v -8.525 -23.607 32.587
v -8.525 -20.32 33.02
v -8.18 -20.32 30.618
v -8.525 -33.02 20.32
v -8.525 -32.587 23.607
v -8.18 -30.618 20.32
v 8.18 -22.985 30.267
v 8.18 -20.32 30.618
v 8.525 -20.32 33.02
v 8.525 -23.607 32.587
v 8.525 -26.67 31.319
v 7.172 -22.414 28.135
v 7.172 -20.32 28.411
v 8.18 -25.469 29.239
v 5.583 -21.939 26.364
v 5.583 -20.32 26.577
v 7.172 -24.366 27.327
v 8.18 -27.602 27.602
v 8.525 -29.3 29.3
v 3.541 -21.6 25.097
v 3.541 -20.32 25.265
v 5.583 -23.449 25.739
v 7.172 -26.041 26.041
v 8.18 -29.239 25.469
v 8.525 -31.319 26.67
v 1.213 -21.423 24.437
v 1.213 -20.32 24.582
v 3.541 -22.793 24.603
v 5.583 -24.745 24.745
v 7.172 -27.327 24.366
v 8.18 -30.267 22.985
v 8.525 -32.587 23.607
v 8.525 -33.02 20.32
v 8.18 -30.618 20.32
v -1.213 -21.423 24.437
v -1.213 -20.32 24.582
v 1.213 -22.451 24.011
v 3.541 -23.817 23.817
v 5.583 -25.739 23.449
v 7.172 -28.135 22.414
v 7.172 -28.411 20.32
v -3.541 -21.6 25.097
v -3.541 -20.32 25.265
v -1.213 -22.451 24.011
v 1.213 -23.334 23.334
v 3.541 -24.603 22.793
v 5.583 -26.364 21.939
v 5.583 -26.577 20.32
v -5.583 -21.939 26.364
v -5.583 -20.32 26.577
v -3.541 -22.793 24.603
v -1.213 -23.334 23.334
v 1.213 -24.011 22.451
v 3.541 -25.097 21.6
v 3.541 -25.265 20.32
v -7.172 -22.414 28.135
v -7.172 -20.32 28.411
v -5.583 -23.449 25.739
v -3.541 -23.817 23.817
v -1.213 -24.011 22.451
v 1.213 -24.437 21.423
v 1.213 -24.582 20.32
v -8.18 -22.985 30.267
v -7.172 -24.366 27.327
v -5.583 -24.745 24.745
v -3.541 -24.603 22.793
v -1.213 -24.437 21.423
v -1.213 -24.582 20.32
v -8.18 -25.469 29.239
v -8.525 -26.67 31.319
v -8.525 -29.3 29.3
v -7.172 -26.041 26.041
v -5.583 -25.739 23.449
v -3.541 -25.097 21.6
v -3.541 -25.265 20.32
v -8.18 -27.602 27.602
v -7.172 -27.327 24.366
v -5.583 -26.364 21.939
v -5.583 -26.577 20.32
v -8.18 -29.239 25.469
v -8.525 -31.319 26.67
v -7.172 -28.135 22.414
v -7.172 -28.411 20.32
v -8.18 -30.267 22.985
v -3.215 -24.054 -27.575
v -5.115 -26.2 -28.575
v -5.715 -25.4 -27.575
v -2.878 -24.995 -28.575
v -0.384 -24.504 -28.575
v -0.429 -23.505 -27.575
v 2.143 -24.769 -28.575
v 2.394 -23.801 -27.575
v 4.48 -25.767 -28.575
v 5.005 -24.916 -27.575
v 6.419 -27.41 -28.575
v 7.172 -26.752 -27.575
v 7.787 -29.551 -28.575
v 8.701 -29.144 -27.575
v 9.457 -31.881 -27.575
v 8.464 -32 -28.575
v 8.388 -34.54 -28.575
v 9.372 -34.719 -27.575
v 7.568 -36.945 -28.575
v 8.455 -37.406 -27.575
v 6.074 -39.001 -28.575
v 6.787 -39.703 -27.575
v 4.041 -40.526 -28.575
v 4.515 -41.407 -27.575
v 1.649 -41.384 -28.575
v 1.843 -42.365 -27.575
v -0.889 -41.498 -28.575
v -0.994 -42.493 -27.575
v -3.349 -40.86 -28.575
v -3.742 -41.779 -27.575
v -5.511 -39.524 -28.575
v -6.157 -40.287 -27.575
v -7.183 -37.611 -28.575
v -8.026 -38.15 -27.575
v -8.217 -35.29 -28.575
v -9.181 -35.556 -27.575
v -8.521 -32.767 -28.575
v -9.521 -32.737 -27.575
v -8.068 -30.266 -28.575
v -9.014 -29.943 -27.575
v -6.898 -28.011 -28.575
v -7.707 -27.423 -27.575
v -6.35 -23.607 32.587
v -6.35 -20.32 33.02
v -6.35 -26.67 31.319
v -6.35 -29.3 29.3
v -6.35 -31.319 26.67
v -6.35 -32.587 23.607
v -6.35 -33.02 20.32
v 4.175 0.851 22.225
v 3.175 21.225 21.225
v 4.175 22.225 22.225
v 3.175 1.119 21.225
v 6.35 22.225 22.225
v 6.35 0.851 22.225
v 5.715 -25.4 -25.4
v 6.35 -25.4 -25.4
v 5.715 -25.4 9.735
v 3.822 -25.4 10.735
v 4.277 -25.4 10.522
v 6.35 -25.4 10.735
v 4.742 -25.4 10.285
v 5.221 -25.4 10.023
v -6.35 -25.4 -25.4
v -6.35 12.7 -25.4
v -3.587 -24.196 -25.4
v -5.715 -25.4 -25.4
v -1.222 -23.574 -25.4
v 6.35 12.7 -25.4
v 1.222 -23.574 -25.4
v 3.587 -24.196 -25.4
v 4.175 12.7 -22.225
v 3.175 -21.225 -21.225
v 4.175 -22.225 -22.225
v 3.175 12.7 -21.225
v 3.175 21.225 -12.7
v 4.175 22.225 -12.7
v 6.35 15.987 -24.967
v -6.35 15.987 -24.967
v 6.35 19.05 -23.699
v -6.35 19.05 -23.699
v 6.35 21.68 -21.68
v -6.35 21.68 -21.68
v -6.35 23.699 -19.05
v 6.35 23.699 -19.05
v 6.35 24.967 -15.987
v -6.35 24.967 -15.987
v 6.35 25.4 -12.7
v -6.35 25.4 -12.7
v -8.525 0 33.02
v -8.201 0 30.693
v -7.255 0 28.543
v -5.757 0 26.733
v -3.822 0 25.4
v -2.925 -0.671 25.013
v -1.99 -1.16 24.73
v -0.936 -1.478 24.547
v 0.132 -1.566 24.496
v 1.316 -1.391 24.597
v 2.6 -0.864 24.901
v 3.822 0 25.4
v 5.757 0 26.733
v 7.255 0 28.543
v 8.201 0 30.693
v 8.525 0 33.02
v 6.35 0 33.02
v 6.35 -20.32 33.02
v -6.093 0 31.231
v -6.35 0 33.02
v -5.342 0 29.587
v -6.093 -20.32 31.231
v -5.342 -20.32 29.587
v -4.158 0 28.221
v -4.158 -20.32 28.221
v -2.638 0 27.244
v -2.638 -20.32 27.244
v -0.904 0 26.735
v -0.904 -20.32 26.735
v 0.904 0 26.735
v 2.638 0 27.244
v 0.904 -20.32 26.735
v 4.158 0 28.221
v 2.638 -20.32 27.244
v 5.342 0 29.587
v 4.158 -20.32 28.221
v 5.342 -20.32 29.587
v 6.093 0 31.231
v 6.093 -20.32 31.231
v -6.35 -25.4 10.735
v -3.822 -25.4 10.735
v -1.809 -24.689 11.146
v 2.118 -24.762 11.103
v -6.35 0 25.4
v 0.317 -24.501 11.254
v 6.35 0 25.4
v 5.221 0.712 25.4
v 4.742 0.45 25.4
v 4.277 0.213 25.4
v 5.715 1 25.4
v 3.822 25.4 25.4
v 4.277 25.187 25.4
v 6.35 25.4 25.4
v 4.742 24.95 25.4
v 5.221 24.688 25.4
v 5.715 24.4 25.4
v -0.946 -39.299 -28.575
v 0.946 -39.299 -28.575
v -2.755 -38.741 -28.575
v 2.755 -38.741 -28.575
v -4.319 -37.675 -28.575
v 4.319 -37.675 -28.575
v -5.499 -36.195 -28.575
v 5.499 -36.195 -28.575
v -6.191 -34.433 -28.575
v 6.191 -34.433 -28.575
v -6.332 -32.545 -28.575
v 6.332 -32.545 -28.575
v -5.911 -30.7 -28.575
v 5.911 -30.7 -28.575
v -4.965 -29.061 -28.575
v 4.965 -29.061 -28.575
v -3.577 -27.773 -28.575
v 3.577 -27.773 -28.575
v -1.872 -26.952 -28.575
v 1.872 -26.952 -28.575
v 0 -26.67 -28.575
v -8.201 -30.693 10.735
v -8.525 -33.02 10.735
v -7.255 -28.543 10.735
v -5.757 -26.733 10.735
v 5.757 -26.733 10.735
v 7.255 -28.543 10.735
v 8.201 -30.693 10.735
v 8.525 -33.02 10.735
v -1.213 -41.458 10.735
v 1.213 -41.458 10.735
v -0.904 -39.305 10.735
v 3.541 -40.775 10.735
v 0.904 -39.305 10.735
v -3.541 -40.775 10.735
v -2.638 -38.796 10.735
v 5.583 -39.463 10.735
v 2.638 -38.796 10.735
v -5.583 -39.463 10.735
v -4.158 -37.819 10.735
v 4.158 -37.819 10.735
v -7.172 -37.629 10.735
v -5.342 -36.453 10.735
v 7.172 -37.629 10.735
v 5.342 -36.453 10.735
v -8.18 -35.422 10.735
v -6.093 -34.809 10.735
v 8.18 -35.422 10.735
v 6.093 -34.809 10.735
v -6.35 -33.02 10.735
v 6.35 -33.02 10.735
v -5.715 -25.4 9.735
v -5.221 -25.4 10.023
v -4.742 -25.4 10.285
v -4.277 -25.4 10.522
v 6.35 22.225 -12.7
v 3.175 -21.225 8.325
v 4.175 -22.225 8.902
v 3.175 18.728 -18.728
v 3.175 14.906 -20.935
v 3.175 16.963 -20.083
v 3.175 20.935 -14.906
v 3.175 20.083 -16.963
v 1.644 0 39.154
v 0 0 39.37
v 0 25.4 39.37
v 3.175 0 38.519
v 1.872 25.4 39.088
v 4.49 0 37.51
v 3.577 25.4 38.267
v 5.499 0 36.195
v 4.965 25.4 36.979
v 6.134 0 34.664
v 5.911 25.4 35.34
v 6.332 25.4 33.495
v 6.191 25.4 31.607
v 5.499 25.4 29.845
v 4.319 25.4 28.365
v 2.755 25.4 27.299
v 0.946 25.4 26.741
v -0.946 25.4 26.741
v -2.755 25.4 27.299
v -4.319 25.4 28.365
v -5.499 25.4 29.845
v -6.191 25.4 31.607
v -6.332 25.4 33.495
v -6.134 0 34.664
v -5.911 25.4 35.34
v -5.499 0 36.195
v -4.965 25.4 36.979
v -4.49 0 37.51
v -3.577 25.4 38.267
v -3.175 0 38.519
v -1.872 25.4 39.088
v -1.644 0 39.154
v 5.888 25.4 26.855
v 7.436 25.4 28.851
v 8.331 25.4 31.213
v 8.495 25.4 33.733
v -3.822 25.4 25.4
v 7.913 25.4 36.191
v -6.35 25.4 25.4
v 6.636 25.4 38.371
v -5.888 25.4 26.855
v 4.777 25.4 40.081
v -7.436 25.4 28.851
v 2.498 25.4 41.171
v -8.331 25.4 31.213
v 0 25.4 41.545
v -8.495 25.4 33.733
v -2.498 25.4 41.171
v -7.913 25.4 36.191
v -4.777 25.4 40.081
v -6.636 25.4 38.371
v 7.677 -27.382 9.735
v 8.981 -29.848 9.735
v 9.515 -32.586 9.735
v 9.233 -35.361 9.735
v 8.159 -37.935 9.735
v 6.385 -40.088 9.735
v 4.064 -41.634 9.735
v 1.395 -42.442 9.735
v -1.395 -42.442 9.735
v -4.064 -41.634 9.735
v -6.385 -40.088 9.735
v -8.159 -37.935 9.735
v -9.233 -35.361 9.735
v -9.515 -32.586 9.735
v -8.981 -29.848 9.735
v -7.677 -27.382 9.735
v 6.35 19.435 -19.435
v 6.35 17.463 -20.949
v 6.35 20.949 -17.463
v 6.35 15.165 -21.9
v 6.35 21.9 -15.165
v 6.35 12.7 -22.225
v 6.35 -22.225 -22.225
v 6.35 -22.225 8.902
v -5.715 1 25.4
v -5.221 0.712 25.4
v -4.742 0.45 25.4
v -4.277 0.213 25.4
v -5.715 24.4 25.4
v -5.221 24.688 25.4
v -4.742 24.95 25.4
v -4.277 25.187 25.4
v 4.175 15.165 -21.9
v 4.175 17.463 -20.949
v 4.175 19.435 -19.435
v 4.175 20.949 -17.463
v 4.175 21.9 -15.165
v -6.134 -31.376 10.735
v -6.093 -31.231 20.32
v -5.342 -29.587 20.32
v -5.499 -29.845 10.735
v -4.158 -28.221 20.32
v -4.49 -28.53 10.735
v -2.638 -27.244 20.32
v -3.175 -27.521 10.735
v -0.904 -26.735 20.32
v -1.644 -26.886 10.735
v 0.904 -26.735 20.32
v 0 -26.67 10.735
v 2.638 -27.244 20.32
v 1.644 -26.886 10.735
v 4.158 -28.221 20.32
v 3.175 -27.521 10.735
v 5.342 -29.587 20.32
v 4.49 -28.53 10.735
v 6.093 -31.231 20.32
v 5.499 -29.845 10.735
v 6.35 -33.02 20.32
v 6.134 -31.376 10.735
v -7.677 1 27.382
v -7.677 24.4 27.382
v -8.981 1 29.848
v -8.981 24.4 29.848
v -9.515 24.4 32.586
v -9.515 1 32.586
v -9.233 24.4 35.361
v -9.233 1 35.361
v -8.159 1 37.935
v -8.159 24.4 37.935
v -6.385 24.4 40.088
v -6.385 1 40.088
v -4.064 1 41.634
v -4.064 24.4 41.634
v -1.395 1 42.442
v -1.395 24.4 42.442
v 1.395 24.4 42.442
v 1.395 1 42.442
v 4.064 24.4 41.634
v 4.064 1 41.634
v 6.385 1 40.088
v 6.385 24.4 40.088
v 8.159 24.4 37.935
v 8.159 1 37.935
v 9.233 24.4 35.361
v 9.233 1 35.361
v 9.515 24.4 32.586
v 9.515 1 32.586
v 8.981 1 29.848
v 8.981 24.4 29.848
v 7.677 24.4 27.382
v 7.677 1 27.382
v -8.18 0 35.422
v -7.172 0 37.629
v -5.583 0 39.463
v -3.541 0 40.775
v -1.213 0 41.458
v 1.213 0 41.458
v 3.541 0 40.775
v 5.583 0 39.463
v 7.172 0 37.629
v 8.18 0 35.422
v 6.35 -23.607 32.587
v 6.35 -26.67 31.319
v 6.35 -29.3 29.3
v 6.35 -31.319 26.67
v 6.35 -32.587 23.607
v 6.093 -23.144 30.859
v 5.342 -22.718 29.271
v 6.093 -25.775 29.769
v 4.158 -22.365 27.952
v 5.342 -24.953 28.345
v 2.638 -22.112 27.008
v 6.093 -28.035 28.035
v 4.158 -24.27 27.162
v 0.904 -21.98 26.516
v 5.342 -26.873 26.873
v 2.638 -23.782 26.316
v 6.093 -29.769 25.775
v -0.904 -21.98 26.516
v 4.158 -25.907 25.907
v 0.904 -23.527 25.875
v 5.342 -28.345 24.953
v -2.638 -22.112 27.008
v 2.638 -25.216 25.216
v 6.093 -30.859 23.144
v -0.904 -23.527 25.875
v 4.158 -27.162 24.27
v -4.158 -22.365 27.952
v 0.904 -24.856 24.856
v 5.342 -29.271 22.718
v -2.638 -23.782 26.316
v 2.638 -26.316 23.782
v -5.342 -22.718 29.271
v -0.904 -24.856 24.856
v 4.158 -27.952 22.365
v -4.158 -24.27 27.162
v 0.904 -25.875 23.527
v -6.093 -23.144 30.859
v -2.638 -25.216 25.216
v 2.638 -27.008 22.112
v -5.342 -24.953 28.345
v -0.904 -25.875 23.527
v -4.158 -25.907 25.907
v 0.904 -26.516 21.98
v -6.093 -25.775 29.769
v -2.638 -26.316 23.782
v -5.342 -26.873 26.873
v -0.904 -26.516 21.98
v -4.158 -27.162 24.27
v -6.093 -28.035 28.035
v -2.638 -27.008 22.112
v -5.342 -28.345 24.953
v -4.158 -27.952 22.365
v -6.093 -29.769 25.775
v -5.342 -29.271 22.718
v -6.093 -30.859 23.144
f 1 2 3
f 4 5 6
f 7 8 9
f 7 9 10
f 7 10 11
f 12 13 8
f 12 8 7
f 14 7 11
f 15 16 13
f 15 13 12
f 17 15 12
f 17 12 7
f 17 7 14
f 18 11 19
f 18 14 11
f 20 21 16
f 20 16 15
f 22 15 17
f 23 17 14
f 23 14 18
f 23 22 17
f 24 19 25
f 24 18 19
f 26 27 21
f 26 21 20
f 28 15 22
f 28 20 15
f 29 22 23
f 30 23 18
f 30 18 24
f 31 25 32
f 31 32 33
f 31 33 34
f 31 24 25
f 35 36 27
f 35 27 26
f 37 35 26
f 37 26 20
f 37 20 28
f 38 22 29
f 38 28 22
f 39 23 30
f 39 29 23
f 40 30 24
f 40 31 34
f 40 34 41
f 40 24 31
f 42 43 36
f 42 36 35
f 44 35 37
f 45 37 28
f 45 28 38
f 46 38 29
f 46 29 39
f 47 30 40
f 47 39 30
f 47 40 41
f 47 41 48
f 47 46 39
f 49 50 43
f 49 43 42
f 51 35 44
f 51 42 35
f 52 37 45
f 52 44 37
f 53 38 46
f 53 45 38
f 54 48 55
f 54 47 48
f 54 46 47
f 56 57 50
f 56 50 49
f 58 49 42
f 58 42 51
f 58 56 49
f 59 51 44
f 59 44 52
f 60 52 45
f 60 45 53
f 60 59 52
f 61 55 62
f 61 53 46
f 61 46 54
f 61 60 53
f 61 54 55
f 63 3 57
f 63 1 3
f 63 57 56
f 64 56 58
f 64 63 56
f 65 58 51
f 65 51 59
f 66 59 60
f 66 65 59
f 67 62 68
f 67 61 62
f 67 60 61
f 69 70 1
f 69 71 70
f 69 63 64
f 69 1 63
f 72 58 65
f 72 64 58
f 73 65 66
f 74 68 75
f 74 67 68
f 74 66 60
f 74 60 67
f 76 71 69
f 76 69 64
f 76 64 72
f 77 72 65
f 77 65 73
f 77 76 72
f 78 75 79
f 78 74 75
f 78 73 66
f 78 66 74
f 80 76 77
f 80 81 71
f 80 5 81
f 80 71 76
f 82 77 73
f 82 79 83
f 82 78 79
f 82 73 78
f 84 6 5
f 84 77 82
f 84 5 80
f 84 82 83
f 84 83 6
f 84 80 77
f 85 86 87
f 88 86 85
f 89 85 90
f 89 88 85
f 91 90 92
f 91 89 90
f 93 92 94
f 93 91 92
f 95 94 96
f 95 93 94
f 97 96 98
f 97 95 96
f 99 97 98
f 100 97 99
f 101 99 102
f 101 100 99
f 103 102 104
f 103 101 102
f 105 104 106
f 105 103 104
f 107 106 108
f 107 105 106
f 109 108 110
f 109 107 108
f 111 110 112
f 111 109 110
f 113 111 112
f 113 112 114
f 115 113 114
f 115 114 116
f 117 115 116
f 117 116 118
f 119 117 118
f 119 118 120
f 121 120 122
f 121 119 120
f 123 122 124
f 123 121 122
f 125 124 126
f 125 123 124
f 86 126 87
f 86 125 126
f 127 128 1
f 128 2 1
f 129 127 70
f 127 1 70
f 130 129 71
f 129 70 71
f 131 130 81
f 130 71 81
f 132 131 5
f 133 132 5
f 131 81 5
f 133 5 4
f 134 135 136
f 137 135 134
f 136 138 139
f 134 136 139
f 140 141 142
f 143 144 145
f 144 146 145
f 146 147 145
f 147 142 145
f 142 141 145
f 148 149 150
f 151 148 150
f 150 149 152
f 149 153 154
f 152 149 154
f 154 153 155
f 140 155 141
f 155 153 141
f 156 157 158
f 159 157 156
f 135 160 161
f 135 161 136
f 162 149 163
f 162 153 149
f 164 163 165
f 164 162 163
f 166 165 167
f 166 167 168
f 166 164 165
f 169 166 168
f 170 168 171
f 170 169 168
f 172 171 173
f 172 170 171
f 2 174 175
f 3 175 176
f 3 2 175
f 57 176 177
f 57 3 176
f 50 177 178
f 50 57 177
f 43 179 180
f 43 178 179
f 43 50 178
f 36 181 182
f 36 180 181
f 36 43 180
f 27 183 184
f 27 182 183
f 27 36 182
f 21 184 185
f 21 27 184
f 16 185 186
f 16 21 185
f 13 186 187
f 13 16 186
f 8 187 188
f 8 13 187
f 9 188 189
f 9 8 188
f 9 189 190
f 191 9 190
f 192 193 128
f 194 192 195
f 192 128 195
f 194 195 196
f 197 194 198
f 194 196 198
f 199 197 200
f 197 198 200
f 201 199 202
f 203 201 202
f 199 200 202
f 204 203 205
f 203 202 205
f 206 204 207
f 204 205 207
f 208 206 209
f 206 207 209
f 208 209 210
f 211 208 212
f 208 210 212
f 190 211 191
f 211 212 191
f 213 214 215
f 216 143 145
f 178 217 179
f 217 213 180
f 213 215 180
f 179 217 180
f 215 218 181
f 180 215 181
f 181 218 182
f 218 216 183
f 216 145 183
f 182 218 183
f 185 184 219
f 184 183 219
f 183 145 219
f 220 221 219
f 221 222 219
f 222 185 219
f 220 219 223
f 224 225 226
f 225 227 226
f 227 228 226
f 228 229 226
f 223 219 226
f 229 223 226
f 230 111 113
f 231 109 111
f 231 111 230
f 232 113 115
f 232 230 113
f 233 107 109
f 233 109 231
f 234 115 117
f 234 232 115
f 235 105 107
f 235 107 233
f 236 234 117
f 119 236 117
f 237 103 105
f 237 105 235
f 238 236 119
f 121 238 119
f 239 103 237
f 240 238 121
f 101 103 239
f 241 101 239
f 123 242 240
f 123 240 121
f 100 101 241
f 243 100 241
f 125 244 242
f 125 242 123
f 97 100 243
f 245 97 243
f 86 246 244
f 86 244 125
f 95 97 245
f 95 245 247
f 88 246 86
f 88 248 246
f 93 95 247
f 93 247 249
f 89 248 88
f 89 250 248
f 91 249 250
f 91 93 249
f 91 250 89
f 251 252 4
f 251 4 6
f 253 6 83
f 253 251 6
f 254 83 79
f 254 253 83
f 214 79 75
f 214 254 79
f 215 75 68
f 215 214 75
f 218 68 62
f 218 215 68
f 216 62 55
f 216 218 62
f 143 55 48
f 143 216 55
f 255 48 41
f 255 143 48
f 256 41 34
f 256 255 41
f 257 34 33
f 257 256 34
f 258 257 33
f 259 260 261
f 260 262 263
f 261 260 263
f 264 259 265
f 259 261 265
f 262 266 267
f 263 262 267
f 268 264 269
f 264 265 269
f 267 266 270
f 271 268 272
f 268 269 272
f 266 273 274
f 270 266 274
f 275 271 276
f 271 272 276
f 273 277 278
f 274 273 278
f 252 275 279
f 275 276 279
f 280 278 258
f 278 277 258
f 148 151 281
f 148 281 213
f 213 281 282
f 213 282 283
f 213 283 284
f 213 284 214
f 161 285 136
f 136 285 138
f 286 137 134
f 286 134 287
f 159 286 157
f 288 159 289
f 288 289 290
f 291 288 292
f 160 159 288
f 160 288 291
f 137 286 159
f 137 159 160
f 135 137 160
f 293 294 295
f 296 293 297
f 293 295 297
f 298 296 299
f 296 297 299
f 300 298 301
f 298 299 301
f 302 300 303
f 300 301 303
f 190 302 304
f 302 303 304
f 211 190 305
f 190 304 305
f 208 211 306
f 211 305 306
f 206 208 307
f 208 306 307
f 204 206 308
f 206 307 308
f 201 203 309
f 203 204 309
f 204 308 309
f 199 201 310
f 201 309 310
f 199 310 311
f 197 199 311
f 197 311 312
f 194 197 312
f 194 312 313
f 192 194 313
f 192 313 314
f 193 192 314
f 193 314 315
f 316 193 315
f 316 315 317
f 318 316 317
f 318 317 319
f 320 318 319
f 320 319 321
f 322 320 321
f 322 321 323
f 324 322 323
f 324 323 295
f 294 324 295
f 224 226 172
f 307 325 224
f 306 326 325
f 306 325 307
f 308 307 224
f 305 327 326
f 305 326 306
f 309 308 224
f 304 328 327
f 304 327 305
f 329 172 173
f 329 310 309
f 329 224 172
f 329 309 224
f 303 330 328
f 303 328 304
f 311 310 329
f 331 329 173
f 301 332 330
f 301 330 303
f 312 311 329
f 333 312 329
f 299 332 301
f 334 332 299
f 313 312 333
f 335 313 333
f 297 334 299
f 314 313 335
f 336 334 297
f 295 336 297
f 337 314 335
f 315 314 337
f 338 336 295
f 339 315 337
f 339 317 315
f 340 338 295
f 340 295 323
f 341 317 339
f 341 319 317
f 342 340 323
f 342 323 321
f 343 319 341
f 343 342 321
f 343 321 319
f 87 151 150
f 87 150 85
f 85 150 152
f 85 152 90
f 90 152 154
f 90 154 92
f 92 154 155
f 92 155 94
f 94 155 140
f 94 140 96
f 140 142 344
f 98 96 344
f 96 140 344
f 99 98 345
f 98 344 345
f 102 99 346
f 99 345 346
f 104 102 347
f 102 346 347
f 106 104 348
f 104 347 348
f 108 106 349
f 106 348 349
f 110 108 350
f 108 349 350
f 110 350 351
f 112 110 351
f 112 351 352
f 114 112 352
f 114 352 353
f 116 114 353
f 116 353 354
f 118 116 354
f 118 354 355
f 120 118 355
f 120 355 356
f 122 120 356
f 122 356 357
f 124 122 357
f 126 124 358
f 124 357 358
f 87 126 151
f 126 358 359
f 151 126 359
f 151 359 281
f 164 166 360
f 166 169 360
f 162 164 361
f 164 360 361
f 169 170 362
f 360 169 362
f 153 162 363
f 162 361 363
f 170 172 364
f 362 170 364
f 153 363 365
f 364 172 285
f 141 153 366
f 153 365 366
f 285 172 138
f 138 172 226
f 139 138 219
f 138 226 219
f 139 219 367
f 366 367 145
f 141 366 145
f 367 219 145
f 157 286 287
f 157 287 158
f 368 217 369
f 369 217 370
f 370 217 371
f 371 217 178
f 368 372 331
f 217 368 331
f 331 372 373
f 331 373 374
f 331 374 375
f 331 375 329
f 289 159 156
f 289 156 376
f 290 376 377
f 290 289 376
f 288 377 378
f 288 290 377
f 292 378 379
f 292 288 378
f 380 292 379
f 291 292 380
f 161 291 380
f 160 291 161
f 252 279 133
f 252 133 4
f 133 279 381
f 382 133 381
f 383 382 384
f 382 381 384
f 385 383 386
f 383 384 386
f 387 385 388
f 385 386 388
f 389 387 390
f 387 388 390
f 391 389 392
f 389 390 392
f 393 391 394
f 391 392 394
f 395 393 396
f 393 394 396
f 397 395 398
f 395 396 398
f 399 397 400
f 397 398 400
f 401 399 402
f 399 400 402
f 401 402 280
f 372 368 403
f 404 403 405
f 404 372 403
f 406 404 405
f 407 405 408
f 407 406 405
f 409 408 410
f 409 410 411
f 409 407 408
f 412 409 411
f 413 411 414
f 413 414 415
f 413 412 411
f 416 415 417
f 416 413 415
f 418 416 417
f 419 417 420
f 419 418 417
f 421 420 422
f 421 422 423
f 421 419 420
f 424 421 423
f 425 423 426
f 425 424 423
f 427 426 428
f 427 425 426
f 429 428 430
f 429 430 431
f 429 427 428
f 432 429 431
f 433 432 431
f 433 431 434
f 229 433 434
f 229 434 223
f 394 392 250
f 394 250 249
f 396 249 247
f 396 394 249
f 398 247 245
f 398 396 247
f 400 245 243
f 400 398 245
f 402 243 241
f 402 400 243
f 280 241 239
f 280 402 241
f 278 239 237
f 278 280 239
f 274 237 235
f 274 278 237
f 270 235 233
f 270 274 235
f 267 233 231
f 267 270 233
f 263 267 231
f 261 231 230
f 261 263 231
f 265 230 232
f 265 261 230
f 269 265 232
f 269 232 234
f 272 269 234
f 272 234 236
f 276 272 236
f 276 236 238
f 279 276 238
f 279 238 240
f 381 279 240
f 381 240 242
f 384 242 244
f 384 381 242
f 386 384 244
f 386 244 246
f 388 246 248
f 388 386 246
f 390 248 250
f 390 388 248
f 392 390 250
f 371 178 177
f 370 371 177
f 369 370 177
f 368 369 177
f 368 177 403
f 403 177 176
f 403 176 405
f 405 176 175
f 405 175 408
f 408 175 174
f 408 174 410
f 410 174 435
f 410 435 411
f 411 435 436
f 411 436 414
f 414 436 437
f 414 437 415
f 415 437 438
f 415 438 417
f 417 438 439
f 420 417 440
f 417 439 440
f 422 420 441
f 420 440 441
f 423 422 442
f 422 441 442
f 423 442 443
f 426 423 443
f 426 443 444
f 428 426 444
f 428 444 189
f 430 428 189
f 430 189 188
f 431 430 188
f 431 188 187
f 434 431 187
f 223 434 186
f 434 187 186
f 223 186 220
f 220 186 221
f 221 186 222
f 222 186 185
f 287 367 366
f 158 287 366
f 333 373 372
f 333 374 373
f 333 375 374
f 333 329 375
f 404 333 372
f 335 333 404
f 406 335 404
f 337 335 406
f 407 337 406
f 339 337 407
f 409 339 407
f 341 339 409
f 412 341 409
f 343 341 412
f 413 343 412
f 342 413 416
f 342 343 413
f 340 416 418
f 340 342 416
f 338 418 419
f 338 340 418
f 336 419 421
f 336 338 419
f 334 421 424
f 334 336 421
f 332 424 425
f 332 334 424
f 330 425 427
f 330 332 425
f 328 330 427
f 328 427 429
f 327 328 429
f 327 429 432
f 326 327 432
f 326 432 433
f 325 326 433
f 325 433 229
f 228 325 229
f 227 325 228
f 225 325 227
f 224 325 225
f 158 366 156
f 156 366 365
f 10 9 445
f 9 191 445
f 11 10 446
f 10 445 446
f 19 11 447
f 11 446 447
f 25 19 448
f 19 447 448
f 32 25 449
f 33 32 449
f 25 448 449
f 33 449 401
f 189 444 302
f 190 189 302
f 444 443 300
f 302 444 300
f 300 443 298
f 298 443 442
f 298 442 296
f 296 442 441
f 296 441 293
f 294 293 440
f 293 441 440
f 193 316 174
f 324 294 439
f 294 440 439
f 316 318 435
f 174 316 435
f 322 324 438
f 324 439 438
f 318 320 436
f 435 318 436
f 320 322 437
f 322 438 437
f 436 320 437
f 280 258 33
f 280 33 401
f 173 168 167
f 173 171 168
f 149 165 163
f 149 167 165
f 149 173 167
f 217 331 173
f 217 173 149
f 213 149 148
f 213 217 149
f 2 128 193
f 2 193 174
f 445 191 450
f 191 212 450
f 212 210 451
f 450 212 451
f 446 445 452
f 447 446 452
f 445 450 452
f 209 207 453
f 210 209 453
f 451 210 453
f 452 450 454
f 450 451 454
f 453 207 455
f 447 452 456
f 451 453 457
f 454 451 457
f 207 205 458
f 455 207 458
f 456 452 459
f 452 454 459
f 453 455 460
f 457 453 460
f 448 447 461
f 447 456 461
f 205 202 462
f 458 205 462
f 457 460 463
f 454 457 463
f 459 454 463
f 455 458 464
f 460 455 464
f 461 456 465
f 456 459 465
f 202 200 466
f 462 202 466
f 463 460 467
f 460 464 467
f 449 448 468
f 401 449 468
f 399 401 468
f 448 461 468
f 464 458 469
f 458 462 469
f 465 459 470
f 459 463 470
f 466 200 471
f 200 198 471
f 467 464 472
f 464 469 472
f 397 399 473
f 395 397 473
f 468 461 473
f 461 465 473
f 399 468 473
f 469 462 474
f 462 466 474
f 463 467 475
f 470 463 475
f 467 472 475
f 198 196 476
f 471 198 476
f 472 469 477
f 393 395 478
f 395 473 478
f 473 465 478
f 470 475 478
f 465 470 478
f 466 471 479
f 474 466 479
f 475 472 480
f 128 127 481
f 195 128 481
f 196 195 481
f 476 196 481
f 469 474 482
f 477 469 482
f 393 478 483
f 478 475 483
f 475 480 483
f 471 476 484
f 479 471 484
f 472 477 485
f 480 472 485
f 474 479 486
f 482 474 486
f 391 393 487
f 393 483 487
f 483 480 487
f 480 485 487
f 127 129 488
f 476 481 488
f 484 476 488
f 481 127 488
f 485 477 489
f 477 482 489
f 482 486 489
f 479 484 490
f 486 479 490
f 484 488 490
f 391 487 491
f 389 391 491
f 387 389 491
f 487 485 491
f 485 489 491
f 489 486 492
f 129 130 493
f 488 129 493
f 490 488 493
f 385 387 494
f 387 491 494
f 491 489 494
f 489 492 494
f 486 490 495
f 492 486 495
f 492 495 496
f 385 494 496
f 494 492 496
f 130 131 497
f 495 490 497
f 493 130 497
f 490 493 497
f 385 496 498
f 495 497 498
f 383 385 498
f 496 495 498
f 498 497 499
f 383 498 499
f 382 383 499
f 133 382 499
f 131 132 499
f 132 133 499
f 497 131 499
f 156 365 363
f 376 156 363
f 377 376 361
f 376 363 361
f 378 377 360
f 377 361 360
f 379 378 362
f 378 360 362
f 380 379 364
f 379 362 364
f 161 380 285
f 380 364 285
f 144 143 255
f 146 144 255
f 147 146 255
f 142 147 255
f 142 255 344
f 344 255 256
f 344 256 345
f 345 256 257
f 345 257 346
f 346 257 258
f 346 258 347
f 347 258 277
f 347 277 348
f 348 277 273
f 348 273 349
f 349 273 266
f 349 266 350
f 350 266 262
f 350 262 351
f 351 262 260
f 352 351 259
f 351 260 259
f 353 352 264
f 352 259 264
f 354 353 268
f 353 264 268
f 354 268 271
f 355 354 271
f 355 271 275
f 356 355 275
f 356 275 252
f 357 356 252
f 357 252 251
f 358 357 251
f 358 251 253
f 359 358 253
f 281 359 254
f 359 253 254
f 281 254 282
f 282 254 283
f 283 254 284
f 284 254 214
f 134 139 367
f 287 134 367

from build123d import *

# Parameters (mm, degrees)
BOSS_EXTRUDE1_DEPTH      = 6.35
FILLET1_R                = 12.7
CUT_EXTRUDE2_DEPTH       = 3.175
BOSS_EXTRUDE2_DEPTH      = 3.175
BOSS_EXTRUDE2_DEPTH_BACK = 36.135303
SKETCH4_R                = 9.525
SKETCH4_R_2              = 6.35
SKETCH5_R                = 9.525
SKETCH5_R_2              = 6.35
BOSS_EXTRUDE3_DEPTH      = 25.4
CHAMFER2_SIZE            = 1
CHAMFER4_SIZE            = 1


with BuildPart() as part:
    # Sketch1 → Boss-Extrude1 (new, symmetric)
    with BuildSketch(Plane.YZ):
        Polygon((-25.4, 10.735303163), (0, 25.4), (25.4, 25.4), (25.4, -25.4), (-25.4, -25.4), align=None)
    extrude(amount=BOSS_EXTRUDE1_DEPTH, both=True)

    # Fillet1
    fillet1_edges = [part.edges().sort_by_distance(p)[0] for p in [
        (0, 25.4, -25.4),
    ]]
    fillet(fillet1_edges, radius=FILLET1_R)

    # Sketch3 → Cut-Extrude2 (cut)
    with BuildSketch(Plane.YZ.offset(6.35)):
        with BuildLine():
            Line((-22.225, -22.225), (12.7, -22.225))
            ThreePointArc((12.7, -22.225), (19.435192091, -19.435192091), (22.225, -12.7))
            Line((22.225, -12.7), (22.225, 22.225))
            Line((22.225, 22.225), (0.850738686, 22.225))
            Line((0.850738686, 22.225), (-22.225, 8.902216058))
            Line((-22.225, 8.902216058), (-22.225, -22.225))
        make_face()
    extrude(amount=-CUT_EXTRUDE2_DEPTH, mode=Mode.SUBTRACT)

    # Sketch4 → Boss-Extrude2 (add, two sides: drawn at the far end of the back side and taken through both)
    with BuildSketch(Plane(origin=(0, 0, -25.4), x_dir=(1, 0, 0), z_dir=(0, 0, -1)).offset(-BOSS_EXTRUDE2_DEPTH_BACK)):
        with Locations(Location((0, 33.02, 0), (0, 0, 233.130102354))):
            Circle(SKETCH4_R)
        with Locations(Location((0, 33.02, 0), (0, 0, 270))):
            Circle(SKETCH4_R_2, mode=Mode.SUBTRACT)
    extrude(amount=BOSS_EXTRUDE2_DEPTH + BOSS_EXTRUDE2_DEPTH_BACK)

    # Sketch5 → Boss-Extrude3 (add)
    with BuildSketch(Plane(origin=(0, 25.4, 0), x_dir=(-1, 0, 0), z_dir=(0, 1, 0))):
        with Locations((0, 33.02)):
            Circle(SKETCH5_R)
        with Locations(Location((0, 33.02, 0), (0, 0, 90))):
            Circle(SKETCH5_R_2, mode=Mode.SUBTRACT)
    extrude(amount=-BOSS_EXTRUDE3_DEPTH)

    # Chamfer2
    # the kernel refuses this chamfer: 1 mm, written as the material it takes off along each edge
    with BuildSketch(Plane(origin=(0, -33.02, 10.735303), x_dir=(0.3638595085405839, 0.931453841070294, 0), z_dir=(-0.931453841070294, 0.3638595085405839, 0))) as chamfer2_piece_1_section:
        Polygon((9.525, CHAMFER2_SIZE), (9.525 - CHAMFER2_SIZE, 0), (9.525, 0), align=None)
    chamfer2_piece_1 = revolve(axis=Axis((0, -33.02, 10.735303), (0, 0, -1)), revolution_arc=317.325176487, mode=Mode.PRIVATE)
    chamfer2_piece_1 = split(chamfer2_piece_1, bisect_by=Plane(origin=(5.777045626, -25.4, 10.24862198), z_dir=(0, -1, 0)), keep=Keep.TOP, mode=Mode.PRIVATE)
    add(chamfer2_piece_1, mode=Mode.SUBTRACT)
    with BuildSketch(Plane(origin=(0, -33.02, -28.575), x_dir=(-0.6000000000021781, 0.7999999999983665, 0), z_dir=(-0.7999999999983665, -0.6000000000021781, 0))) as chamfer2_piece_2:
        Polygon((9.525, -CHAMFER2_SIZE), (9.525 - CHAMFER2_SIZE, 0), (9.525, 0), align=None)
    revolve(axis=Axis((0, -33.02, -28.575), (0, 0, -1)), mode=Mode.SUBTRACT)
    with BuildSketch(Plane(origin=(0, 25.4, 33.02), x_dir=(-0.3638595085405501, 0, -0.9314538410703074), z_dir=(0.9314538410703074, 0, -0.3638595085405501))) as chamfer2_piece_3_section:
        Polygon((9.525, -CHAMFER2_SIZE), (9.525 - CHAMFER2_SIZE, 0), (9.525, 0), align=None)
    chamfer2_piece_3 = revolve(axis=Axis((0, 25.4, 33.02), (0, 1, 0)), revolution_arc=317.325176487, mode=Mode.PRIVATE)
    chamfer2_piece_3 = split(chamfer2_piece_3, bisect_by=Plane(origin=(0, 24.920234358, 25.4), z_dir=(0, 0, 1)), keep=Keep.TOP, mode=Mode.PRIVATE)
    add(chamfer2_piece_3, mode=Mode.SUBTRACT)
    with BuildSketch(Plane(origin=(0, 0, 33.02), x_dir=(-0.3638595085405531, 0, -0.9314538410703063), z_dir=(0.9314538410703063, 0, -0.3638595085405531))) as chamfer2_piece_4_section:
        Polygon((9.525, CHAMFER2_SIZE), (9.525 - CHAMFER2_SIZE, 0), (9.525, 0), align=None)
    chamfer2_piece_4 = revolve(axis=Axis((0, 0, 33.02), (0, 1, 0)), revolution_arc=317.325176487, mode=Mode.PRIVATE)
    chamfer2_piece_4 = split(chamfer2_piece_4, bisect_by=Plane(origin=(-5.452412952, 0.490850729, 25.4), z_dir=(0, 0, 1)), keep=Keep.TOP, mode=Mode.PRIVATE)
    add(chamfer2_piece_4, mode=Mode.SUBTRACT)

    # Sweep3: sweep along a path in Sketch6
    with BuildLine(Plane.YZ) as sweep3_path:
        Line((0, 33.02), (-20.32, 33.02))
        ThreePointArc((-20.32, 33.02), (-29.300256121, 29.300256121), (-33.02, 20.32))
        Line((-33.02, 20.32), (-33.02, 10.735303163))
    # Sketch7 → Sweep3 (sweep)
    with BuildSketch(Plane.XZ):
        with BuildLine():
            Line((-8.525, 33.02), (-6.35, 33.02))
            ThreePointArc((-6.35, 33.02), (0, 26.67), (6.35, 33.02))
            Line((6.35, 33.02), (8.525, 33.02))
            ThreePointArc((8.525, 33.02), (0, 24.495), (-8.525, 33.02))
        make_face()
    sweep(path=sweep3_path.line)

    # Chamfer4
    chamfer4_edges = [part.edges().sort_by_distance(p)[0] for p in [
        (3.175, -22.225, -6.661391971),
        (3.175, -10.687130657, 15.563608029),
        (3.175, 11.537869343, 22.225),
        (3.175, 22.225, 4.7625),
        (3.175, 19.435192091, -19.435192091),
        (3.175, -4.7625, -22.225),
    ]]
    chamfer(chamfer4_edges, length=CHAMFER4_SIZE)


solid = part.part
